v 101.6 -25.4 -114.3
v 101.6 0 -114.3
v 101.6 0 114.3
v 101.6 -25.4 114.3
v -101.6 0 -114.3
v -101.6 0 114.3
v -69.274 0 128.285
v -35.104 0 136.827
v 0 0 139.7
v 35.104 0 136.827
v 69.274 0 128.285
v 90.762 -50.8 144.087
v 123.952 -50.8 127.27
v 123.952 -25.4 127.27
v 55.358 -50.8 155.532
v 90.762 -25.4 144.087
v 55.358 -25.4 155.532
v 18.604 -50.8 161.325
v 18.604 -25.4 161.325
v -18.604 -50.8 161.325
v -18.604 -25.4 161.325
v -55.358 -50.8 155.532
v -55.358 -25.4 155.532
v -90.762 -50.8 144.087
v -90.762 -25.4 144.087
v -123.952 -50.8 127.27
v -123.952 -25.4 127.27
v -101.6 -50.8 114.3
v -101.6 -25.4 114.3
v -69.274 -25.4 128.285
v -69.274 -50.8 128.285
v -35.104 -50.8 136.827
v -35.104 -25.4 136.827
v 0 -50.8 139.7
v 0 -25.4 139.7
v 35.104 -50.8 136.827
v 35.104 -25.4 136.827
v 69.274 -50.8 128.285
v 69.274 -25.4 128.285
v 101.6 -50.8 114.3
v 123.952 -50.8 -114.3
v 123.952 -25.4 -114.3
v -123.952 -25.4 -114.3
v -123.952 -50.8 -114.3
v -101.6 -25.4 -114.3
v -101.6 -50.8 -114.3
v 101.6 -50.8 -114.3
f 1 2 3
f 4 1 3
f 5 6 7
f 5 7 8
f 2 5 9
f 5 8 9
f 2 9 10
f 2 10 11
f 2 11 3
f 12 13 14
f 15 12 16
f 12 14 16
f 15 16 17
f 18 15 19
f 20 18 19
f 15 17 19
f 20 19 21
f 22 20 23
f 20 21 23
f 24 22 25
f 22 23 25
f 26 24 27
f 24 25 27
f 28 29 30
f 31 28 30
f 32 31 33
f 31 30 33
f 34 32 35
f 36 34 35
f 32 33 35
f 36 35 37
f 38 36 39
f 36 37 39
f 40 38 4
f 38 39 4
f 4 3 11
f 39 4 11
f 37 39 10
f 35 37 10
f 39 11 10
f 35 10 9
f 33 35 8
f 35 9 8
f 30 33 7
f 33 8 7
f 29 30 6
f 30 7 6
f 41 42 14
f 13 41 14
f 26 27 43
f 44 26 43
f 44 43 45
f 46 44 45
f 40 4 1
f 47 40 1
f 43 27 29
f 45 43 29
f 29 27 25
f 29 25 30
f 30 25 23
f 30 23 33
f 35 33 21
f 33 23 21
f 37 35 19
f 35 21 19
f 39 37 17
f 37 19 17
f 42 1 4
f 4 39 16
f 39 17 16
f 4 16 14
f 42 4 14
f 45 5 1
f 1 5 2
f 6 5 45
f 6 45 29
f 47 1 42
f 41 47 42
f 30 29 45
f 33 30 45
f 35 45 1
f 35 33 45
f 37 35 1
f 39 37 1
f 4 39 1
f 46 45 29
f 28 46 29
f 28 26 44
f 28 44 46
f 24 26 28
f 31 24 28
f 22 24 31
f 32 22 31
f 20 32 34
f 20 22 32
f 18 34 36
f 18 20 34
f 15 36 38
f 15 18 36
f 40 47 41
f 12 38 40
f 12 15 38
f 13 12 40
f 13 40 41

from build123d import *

# Parameters (mm, degrees)
F0_W     = 203.2
F0_H     = 228.6
F1_DEPTH = 25.4
F3_DEPTH = 25.4


with BuildPart() as f1:
    # F0 (on Front) → F1 (new body)
    with BuildSketch(Plane.XZ):
        Rectangle(F0_W, F0_H)
        with BuildLine():
            Line((-101.6, 114.3), (101.6, 114.3))
            ThreePointArc((101.6, 114.3), (0, 139.7), (-101.6, 114.3))
        make_face()
    extrude(amount=F1_DEPTH)

    # F2 (on face) → F3 (join)
    with BuildSketch(Plane.XZ.offset(25.4)):
        with BuildLine():
            ThreePointArc((123.952, 127.269696), (0, 162.052), (-123.952, 127.269696))
            Line((-123.952, 127.269696), (-123.952, -114.3))
            Line((-123.952, -114.3), (-101.6, -114.3))
            Line((-101.6, -114.3), (-101.6, 114.3))
            ThreePointArc((-101.6, 114.3), (0, 139.7), (101.6, 114.3))
            Line((101.6, 114.3), (101.6, -114.3))
            Line((101.6, -114.3), (123.952, -114.3))
            Line((123.952, -114.3), (123.952, 127.269696))
        make_face()
    extrude(amount=F3_DEPTH)


solid = f1.part
